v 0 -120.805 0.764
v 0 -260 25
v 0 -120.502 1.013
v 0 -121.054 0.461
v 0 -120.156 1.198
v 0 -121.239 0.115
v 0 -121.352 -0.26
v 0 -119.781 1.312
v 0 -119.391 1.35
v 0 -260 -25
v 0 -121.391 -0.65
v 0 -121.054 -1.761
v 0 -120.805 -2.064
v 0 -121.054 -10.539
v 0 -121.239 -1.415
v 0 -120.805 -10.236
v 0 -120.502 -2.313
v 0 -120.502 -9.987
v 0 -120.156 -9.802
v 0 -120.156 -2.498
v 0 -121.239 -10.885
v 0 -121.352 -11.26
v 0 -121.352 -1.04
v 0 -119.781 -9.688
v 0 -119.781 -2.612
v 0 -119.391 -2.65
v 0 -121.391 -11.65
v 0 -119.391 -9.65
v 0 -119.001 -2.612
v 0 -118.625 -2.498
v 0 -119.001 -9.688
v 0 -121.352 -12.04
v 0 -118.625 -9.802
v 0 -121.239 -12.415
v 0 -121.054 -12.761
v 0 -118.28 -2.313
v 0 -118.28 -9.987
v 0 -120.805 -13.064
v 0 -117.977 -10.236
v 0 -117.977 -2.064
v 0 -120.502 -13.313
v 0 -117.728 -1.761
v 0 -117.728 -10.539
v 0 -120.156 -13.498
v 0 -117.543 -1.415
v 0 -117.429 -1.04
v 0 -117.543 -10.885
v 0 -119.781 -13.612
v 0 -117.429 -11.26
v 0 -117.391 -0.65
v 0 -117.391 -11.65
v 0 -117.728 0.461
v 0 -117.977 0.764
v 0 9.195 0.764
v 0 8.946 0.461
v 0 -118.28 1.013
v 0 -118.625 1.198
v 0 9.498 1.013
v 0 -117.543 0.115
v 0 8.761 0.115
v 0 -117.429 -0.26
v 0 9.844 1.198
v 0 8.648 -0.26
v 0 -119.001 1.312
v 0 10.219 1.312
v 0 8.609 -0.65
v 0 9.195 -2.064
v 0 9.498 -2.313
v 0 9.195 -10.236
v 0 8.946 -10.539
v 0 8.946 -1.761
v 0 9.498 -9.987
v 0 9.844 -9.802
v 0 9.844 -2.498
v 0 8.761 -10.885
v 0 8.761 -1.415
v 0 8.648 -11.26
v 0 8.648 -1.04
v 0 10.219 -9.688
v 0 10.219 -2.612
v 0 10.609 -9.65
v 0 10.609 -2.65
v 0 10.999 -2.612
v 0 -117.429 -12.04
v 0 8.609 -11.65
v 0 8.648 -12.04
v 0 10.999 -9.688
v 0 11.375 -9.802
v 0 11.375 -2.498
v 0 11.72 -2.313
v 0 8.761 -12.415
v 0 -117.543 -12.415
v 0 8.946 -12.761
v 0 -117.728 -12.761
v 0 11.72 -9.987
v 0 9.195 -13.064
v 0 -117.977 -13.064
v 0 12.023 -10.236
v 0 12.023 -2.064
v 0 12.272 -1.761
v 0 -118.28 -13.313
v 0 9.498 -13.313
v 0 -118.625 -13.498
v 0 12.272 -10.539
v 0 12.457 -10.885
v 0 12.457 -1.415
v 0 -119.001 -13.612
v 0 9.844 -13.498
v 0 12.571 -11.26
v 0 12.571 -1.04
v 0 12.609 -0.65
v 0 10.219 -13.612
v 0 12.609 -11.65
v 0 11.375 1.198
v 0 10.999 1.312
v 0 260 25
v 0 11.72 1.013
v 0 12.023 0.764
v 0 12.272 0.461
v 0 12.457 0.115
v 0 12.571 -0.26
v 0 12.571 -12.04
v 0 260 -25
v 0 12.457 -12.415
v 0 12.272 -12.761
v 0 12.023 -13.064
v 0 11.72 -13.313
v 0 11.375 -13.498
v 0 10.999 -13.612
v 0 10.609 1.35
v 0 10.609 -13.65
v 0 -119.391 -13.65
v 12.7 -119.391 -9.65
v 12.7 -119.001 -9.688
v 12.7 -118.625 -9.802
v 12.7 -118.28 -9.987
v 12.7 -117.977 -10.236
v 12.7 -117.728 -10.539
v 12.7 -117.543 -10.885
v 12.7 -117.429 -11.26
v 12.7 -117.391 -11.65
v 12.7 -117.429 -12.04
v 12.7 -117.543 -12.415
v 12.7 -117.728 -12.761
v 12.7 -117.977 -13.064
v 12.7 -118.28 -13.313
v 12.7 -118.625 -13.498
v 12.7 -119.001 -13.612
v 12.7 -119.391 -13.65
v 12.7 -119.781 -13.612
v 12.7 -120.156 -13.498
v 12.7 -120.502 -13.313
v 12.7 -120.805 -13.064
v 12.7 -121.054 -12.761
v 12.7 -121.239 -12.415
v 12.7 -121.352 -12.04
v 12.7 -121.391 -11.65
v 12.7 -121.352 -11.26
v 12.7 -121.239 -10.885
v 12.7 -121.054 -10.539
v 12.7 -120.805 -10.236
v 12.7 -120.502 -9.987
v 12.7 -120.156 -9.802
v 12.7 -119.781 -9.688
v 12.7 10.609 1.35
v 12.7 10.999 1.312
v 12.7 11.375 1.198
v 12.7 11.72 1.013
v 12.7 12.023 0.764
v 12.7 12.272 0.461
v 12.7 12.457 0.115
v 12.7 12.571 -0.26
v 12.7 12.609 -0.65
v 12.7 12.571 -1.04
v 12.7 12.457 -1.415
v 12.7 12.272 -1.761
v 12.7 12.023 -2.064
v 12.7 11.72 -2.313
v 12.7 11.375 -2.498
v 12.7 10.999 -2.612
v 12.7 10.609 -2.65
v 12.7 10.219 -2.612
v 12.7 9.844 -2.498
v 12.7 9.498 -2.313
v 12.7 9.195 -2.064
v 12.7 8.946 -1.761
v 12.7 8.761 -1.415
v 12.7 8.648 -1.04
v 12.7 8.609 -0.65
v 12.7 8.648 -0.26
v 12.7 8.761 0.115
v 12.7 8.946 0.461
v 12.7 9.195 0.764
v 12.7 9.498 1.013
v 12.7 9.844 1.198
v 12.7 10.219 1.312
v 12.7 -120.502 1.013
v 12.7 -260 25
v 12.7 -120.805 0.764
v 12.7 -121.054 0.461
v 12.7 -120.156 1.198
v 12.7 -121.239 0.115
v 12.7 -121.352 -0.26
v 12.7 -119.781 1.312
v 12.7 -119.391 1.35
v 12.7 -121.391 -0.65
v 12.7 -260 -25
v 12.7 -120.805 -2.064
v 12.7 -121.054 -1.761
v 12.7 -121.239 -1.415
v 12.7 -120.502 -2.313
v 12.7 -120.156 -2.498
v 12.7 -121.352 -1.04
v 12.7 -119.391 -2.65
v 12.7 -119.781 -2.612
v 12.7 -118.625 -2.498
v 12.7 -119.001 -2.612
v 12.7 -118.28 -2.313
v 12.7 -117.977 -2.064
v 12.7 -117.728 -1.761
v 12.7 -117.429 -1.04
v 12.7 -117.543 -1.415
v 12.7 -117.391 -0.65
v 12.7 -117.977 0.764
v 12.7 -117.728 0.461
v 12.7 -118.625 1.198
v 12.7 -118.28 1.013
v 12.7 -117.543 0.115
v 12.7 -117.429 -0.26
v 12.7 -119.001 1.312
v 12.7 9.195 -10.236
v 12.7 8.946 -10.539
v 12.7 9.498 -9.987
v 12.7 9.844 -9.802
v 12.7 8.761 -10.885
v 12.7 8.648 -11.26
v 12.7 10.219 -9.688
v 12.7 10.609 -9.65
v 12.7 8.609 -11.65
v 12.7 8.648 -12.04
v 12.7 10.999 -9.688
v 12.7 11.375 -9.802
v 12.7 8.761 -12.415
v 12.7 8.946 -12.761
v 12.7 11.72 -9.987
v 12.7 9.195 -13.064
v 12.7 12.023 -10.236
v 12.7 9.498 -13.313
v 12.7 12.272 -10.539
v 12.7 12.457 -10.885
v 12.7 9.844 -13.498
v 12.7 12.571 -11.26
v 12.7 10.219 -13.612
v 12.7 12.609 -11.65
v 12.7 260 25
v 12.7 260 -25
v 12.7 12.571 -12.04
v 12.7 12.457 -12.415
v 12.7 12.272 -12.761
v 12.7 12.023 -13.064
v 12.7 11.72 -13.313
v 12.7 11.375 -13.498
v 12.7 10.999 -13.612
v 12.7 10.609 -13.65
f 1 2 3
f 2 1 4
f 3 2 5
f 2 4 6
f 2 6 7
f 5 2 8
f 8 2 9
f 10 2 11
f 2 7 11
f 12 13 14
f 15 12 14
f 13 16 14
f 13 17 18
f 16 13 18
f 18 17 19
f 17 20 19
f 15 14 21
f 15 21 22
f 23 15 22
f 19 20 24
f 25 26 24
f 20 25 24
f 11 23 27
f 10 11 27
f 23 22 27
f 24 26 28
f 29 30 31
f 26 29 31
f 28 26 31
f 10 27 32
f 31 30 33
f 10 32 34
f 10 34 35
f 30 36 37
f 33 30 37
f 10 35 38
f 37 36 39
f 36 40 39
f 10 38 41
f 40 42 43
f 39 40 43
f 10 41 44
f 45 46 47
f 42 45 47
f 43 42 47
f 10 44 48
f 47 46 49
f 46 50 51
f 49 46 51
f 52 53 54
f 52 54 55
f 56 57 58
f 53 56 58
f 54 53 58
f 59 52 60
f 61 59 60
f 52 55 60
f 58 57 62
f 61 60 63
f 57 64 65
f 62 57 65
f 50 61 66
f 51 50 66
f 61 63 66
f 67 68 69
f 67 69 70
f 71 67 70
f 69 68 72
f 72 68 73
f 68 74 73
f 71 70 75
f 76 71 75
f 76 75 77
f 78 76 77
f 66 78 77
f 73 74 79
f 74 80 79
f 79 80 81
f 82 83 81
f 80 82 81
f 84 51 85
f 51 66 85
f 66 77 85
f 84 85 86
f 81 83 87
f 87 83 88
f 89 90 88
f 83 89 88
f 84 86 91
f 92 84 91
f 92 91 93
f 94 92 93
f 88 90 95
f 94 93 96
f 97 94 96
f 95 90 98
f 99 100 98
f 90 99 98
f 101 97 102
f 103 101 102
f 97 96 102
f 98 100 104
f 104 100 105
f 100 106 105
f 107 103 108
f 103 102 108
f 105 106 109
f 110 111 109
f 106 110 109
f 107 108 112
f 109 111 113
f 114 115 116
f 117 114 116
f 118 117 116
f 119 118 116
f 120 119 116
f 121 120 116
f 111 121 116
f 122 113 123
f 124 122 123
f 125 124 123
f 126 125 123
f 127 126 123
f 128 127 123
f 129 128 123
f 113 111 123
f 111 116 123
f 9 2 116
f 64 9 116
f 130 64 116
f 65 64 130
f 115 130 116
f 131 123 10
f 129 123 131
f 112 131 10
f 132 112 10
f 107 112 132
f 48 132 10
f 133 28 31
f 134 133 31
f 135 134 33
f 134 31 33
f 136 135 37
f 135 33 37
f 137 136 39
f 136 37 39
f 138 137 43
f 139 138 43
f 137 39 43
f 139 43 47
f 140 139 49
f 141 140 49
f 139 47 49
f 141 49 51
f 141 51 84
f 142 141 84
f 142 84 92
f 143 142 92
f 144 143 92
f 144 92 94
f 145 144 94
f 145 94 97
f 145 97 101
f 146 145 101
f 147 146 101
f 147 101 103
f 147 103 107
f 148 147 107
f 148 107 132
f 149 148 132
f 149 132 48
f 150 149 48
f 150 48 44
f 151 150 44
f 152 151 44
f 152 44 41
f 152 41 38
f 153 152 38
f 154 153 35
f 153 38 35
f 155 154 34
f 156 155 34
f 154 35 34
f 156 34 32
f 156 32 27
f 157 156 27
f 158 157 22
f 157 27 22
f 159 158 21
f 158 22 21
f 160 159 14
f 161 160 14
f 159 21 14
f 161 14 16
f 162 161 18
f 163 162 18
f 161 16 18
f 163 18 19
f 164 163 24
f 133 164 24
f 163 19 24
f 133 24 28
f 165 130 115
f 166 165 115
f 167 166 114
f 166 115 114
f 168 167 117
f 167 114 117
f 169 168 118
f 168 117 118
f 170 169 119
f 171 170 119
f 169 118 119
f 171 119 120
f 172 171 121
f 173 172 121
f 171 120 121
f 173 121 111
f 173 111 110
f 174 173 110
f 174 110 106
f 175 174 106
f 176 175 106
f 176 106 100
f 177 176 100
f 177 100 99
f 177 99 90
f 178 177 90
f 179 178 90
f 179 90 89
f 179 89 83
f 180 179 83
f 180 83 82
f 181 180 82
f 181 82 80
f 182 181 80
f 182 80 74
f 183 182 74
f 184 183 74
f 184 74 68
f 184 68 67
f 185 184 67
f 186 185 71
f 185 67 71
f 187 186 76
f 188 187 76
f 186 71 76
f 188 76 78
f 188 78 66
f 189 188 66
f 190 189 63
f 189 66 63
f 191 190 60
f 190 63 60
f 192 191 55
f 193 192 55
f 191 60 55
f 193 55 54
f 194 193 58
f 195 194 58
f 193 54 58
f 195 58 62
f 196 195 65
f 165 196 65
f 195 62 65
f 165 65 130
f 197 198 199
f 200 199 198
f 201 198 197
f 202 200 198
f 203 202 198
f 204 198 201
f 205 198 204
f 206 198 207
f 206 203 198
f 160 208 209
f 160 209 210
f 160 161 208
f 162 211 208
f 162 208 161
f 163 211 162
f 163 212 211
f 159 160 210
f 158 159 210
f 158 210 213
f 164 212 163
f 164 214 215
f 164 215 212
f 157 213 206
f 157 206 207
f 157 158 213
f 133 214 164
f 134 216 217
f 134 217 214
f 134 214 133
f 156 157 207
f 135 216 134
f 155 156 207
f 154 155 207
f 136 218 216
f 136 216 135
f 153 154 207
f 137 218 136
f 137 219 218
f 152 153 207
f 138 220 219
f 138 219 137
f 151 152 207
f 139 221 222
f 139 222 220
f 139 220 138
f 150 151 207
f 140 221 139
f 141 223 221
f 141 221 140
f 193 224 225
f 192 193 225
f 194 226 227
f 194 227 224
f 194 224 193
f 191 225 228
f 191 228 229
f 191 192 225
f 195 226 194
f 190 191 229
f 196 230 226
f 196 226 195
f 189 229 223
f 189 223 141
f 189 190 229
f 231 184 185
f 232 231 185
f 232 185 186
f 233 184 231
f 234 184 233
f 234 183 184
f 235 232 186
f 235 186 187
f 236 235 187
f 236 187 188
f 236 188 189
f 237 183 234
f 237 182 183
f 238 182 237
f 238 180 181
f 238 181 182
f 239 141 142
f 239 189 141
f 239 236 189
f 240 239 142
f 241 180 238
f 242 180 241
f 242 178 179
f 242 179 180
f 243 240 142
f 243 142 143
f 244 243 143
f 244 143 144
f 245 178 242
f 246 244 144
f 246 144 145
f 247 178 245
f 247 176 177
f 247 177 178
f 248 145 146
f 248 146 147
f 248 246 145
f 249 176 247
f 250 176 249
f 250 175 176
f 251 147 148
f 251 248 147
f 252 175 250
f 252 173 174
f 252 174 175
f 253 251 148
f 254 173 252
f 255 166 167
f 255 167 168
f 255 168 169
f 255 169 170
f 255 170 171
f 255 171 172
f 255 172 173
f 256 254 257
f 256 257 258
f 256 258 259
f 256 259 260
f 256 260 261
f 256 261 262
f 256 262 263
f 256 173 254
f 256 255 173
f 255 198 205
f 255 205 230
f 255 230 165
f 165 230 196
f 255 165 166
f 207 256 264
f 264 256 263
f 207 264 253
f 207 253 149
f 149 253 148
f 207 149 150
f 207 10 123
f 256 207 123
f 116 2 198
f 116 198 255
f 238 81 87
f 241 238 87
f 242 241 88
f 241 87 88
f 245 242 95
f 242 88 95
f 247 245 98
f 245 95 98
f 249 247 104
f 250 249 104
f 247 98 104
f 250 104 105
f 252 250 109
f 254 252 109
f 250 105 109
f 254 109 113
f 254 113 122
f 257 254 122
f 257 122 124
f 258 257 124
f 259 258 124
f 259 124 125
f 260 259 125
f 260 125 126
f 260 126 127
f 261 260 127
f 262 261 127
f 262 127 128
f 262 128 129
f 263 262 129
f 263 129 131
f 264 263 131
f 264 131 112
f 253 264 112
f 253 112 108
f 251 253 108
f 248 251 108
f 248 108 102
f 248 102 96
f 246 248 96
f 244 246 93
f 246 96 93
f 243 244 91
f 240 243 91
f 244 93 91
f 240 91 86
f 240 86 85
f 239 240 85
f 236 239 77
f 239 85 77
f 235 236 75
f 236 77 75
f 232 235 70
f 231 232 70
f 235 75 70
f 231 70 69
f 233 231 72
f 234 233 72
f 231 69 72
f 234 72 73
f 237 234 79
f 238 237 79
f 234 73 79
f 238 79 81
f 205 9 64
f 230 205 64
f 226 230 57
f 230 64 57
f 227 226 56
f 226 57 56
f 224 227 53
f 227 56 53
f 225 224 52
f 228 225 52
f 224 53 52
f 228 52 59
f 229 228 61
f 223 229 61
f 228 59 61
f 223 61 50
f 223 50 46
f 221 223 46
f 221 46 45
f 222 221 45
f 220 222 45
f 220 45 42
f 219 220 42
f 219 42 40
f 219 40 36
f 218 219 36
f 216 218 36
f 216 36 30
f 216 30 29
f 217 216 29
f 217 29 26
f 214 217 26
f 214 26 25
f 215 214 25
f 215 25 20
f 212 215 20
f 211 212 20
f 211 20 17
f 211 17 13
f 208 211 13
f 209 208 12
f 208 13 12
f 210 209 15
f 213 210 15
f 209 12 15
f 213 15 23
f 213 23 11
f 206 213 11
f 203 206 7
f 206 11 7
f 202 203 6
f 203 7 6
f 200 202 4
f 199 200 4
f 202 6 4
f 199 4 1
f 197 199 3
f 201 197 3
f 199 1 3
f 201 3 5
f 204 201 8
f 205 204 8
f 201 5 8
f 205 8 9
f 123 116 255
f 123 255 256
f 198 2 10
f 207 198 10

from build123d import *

# Parameters (mm, degrees)
SKETCH1_W           = 50
SKETCH1_H           = 520
BOSS_EXTRUDE1_DEPTH = 12.7
SKETCH5_R           = 2
CUT_EXTRUDE1_DEPTH  = 13.7


with BuildPart() as part:
    # Sketch1 → Boss-Extrude1 (new body)
    with BuildSketch(Plane(origin=(0, 0, 0), x_dir=(0, 0, -1), z_dir=(1, 0, 0))):
        Rectangle(SKETCH1_W, SKETCH1_H)
    extrude(amount=BOSS_EXTRUDE1_DEPTH)

    # Sketch5 → Cut-Extrude1 (cut, through all)
    with BuildSketch(Plane.ZY):
        with Locations((-11.65, 10.609140035)):
            Circle(SKETCH5_R)
        with Locations((-0.65, 10.609140035)):
            Circle(SKETCH5_R)
        with Locations((-11.65, -119.390859965)):
            Circle(SKETCH5_R)
        with Locations((-0.65, -119.390859965)):
            Circle(SKETCH5_R)
    extrude(amount=-CUT_EXTRUDE1_DEPTH, mode=Mode.SUBTRACT)


solid = part.part
